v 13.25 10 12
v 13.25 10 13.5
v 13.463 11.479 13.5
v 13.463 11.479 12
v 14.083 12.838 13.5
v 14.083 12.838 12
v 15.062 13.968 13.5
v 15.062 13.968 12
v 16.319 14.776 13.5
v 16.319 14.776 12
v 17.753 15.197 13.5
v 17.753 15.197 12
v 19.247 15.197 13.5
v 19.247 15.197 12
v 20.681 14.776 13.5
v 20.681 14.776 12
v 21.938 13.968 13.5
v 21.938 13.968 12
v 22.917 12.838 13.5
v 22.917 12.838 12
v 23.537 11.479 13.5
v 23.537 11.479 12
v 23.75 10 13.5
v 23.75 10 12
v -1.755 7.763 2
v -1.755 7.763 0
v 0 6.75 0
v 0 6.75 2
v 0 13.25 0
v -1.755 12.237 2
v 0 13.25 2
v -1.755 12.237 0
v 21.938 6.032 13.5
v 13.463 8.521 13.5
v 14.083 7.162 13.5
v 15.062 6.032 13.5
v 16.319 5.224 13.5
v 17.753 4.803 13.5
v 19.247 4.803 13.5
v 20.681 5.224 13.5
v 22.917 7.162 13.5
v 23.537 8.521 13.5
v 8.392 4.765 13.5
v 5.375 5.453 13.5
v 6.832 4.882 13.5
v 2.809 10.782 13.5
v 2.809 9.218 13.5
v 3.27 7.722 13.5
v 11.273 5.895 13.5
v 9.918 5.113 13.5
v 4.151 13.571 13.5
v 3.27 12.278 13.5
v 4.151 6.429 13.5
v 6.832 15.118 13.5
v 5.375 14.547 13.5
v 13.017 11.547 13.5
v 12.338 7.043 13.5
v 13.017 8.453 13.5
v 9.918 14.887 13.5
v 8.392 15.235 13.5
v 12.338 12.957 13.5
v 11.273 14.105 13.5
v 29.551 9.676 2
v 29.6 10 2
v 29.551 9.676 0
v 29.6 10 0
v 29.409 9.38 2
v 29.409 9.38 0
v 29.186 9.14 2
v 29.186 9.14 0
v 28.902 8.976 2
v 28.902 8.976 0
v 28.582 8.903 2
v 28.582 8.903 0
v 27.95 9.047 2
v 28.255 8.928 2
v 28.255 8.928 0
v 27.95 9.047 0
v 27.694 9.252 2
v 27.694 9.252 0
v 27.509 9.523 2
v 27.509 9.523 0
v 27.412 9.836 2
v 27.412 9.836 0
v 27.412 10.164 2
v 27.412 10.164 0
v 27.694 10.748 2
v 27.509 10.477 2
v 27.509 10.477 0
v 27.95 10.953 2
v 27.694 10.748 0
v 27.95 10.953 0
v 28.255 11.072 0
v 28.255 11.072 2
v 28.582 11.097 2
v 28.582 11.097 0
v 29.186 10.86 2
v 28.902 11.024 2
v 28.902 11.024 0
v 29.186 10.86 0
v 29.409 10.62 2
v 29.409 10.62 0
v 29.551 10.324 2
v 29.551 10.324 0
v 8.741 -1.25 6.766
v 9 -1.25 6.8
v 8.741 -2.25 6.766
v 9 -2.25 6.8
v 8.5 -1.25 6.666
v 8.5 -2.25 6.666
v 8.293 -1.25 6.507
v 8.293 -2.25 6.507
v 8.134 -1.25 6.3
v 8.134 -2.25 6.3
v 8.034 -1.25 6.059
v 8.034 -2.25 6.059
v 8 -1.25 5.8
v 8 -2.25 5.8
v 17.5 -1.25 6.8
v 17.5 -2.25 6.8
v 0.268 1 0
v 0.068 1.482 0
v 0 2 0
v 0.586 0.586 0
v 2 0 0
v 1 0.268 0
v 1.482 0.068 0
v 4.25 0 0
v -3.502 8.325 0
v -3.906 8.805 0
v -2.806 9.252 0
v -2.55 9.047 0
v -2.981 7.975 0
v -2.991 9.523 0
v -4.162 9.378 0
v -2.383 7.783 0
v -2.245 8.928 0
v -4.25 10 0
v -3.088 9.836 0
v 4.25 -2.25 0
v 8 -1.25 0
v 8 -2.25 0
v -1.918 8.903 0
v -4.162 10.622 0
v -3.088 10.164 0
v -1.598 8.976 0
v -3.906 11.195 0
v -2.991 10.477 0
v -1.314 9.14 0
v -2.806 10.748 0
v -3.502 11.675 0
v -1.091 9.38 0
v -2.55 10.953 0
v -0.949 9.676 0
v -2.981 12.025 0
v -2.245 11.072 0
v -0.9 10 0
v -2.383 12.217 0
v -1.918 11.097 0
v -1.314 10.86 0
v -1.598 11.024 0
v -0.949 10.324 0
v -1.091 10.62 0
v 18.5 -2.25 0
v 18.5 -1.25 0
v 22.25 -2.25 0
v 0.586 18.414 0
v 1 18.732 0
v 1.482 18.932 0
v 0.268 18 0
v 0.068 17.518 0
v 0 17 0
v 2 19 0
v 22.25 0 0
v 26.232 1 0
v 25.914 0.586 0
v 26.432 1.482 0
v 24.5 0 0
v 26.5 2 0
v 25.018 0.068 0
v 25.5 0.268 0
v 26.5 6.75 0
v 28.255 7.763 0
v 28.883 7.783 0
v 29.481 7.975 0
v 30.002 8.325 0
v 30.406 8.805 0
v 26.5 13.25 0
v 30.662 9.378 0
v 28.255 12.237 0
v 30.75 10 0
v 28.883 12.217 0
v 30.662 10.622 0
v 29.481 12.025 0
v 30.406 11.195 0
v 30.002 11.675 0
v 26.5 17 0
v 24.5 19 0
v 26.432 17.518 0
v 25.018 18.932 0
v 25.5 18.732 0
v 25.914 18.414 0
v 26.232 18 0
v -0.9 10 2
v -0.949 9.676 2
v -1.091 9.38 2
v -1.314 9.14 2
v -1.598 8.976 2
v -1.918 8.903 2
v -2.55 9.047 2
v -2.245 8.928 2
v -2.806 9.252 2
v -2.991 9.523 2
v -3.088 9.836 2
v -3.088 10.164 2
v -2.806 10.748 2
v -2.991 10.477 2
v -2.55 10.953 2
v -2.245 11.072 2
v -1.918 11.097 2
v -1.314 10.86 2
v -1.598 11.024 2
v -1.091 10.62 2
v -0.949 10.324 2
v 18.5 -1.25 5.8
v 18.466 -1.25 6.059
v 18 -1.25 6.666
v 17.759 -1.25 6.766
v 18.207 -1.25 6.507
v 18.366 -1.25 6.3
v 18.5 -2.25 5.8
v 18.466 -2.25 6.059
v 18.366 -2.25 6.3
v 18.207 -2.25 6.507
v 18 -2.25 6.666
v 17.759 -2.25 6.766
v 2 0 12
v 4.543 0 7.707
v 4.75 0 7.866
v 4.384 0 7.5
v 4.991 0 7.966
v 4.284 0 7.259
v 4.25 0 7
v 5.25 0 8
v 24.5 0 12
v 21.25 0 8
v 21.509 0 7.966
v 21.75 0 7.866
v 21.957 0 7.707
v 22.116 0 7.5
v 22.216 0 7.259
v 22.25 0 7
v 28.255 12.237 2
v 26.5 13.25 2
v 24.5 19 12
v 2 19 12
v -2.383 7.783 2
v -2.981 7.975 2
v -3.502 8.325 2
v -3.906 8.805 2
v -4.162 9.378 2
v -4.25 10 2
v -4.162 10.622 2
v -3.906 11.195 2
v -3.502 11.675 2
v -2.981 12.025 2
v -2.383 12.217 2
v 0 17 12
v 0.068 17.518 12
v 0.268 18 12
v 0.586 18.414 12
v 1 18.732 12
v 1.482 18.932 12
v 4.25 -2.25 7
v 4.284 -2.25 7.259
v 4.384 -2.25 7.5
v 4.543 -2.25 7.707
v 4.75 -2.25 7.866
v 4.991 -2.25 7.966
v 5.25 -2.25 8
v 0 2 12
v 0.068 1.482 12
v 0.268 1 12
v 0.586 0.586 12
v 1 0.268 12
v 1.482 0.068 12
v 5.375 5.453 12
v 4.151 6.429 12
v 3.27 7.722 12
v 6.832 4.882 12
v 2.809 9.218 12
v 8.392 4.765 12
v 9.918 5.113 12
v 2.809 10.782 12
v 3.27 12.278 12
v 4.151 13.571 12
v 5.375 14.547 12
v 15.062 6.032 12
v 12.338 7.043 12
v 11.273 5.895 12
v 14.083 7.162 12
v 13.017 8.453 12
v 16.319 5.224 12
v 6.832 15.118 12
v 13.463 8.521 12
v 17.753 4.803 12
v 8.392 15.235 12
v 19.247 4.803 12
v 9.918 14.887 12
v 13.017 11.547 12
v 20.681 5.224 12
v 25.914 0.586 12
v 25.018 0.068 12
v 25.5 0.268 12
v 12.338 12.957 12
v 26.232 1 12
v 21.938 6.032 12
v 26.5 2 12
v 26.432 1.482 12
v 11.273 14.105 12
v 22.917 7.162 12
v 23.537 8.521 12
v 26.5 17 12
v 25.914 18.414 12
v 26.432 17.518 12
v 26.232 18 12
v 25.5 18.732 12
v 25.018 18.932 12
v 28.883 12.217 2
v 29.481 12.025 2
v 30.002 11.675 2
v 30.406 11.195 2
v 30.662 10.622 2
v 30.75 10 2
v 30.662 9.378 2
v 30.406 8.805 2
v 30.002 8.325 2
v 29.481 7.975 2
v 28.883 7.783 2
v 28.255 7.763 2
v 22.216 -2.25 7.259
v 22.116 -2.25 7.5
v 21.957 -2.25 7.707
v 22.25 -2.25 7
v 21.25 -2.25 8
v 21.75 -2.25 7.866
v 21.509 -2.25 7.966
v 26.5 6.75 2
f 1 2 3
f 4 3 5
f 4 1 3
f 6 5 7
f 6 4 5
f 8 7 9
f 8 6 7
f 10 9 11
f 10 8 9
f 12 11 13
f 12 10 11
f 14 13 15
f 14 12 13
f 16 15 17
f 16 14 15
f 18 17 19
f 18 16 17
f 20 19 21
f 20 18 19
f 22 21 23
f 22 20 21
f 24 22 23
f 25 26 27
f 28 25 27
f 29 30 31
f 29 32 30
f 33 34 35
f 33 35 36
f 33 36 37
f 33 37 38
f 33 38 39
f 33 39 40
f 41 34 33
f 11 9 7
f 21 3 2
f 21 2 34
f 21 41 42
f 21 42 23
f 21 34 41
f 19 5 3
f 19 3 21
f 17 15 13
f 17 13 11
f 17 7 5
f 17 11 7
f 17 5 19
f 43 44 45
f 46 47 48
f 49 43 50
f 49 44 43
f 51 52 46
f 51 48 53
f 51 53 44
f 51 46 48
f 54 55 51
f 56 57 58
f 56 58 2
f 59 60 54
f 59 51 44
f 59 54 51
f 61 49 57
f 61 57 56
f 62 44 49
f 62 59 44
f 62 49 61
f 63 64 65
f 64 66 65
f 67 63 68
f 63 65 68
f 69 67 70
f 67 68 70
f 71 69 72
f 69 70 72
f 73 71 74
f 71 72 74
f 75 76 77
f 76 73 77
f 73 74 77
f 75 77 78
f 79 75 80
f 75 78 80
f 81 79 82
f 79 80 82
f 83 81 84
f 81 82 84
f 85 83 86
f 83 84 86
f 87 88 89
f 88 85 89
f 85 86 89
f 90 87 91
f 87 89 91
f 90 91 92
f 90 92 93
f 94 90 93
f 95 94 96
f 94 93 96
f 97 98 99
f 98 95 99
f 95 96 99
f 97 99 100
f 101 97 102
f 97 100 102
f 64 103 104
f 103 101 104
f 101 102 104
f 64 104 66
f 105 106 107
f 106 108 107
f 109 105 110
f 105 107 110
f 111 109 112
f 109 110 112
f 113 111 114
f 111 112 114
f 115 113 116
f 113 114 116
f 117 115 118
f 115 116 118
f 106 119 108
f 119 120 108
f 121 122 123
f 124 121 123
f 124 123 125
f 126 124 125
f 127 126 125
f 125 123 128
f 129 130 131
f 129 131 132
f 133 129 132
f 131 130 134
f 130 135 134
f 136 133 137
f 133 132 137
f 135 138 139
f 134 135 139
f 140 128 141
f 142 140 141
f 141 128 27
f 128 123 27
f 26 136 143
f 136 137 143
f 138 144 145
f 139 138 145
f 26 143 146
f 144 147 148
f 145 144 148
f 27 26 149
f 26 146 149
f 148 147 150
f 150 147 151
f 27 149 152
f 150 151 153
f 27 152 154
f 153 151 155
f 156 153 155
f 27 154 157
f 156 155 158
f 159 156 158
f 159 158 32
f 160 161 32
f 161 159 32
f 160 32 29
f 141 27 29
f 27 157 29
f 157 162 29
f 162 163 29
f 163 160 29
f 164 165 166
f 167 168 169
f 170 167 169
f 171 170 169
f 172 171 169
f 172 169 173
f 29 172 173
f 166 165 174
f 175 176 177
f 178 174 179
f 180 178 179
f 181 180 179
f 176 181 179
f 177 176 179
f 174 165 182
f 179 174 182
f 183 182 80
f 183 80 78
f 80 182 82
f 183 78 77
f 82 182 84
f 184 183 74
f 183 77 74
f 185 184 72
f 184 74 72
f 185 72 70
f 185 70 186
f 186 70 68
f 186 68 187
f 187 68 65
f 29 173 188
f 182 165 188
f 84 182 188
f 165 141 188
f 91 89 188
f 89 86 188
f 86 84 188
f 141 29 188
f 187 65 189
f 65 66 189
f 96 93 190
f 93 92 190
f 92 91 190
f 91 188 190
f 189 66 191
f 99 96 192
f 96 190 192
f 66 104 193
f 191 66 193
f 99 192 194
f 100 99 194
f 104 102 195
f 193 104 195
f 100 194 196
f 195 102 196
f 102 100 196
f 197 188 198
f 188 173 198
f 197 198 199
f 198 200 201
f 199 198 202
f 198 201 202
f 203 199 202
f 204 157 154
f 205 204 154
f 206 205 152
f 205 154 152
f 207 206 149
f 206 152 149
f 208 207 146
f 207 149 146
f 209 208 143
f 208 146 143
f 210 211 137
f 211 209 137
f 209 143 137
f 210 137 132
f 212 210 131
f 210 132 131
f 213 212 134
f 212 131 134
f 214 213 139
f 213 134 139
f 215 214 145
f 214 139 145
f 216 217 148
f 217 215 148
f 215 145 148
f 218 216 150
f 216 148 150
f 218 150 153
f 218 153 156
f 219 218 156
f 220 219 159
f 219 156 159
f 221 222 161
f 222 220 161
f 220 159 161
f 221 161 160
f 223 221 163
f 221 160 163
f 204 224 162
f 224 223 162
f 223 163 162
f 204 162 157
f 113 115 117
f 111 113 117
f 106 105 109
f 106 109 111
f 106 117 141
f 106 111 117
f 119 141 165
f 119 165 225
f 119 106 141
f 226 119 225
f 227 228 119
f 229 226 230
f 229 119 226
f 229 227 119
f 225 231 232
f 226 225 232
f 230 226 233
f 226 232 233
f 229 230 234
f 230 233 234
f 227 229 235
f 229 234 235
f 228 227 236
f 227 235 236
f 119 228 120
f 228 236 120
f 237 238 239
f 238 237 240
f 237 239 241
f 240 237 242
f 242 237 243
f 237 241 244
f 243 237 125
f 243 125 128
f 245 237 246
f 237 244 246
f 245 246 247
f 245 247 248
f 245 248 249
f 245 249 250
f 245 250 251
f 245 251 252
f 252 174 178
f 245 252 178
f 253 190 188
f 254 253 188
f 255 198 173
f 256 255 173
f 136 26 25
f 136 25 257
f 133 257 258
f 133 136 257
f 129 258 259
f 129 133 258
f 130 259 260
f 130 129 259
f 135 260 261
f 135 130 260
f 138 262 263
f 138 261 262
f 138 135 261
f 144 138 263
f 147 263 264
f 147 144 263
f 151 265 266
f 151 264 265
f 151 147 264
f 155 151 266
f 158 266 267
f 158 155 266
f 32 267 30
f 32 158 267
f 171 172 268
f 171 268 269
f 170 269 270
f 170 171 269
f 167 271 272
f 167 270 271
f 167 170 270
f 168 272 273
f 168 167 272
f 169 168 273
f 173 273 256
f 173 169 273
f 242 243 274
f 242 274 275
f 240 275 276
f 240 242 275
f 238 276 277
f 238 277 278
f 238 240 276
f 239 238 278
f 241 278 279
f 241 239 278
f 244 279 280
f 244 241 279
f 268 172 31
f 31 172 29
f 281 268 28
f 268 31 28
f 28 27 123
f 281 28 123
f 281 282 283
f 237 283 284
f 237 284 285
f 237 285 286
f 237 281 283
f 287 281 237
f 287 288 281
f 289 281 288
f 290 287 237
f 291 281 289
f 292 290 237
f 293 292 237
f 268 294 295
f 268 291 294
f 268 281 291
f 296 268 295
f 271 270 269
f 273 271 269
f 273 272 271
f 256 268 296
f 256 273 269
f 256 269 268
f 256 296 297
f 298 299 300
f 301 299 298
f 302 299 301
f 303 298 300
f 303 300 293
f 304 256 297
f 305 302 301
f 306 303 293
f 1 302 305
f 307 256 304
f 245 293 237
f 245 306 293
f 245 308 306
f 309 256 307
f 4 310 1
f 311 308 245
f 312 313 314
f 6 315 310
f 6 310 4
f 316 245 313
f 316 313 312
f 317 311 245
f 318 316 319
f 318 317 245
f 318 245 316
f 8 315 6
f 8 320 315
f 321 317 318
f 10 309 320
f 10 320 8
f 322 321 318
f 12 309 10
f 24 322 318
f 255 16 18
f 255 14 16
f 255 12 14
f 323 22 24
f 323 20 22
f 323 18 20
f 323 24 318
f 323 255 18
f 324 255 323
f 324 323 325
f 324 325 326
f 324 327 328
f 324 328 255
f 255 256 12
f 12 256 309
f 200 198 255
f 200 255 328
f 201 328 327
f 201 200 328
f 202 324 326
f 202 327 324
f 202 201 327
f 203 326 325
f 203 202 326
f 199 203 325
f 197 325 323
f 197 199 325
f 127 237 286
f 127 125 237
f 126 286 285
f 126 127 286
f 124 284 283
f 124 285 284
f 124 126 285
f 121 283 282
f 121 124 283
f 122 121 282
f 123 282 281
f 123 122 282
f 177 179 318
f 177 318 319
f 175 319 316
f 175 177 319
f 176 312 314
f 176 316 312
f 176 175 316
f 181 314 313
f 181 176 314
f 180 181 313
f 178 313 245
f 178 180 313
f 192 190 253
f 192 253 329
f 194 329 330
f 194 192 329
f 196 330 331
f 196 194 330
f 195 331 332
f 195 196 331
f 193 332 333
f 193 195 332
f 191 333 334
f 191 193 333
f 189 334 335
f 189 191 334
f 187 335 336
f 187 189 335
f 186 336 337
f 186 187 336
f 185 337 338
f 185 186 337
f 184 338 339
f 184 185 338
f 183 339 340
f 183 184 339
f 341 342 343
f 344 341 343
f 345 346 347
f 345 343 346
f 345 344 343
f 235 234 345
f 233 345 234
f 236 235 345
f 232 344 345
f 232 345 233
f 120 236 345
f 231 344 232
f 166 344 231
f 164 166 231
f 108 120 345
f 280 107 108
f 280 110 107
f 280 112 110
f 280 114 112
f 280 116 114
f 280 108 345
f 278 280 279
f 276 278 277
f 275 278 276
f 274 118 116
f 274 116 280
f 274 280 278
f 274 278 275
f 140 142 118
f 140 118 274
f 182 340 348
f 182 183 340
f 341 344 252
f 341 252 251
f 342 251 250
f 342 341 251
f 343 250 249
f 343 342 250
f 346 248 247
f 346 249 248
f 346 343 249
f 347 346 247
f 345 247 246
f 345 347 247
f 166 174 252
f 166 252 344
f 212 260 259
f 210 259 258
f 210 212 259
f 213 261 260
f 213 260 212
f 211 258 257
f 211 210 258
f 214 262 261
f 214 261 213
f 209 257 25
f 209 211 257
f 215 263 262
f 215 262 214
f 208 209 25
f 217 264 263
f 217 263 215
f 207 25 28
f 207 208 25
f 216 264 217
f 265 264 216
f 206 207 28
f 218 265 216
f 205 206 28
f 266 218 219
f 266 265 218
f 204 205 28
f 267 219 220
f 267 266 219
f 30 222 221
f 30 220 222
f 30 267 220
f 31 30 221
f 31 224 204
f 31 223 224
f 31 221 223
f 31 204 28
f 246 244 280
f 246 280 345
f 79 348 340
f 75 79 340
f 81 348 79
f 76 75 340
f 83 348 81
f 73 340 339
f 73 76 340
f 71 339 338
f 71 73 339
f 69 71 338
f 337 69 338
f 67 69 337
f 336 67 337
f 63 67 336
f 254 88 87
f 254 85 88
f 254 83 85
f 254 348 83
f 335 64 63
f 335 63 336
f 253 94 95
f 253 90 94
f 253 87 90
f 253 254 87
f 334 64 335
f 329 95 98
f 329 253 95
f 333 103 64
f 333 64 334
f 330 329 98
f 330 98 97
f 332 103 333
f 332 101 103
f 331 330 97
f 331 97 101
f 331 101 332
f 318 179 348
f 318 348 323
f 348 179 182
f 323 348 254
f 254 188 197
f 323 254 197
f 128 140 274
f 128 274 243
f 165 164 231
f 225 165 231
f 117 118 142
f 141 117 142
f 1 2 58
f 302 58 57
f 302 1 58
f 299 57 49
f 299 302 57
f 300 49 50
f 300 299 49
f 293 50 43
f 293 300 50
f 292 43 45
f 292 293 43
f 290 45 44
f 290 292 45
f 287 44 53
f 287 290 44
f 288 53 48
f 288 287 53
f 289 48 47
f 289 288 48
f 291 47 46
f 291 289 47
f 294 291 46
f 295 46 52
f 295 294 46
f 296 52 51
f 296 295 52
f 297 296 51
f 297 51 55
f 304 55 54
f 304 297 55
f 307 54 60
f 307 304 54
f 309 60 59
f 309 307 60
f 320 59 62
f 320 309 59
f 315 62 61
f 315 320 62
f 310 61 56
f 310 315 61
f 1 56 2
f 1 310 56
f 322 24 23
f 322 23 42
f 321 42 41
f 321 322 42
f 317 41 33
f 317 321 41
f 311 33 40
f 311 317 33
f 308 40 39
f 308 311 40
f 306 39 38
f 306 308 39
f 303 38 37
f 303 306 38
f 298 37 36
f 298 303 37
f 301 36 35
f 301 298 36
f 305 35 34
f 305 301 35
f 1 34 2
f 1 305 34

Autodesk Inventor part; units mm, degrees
ref_plane "YZ Plane" through (0, 0, 0) normal (1, 0, 0) x (0, 1, 0)
ref_plane "XZ Plane" through (0, 0, 0) normal (0, 1, 0) x (-1, 0, 0)
ref_plane "XY Plane" through (0, 0, 0) normal (0, 0, 1) x (1, 0, 0)
sketch "Sketch1" plane through (0, 0, 0) normal (0, 0, 1) x (1, 0, 0)
  line L0 (2, 0) -> (24.5, 0)
  line L1 (26.5, 2) -> (26.5, 17)
  line L2 (24.5, 19) -> (2, 19)
  line L3 (0, 17) -> (0, 2)
  arc A0 (2, 19) -> (0, 17) centre (2, 17) ccw
  arc A1 (26.5, 17) -> (24.5, 19) centre (24.5, 17) ccw
  arc A2 (0, 2) -> (2, 0) centre (2, 2) ccw
  arc A3 (24.5, 0) -> (26.5, 2) centre (24.5, 2) ccw
  line L4 (4.25, 0) -> (22.25, 0)
  line L5 (22.25, 0) -> (22.25, -2.25)
  line L6 (22.25, -2.25) -> (4.25, -2.25)
  line L7 (4.25, -2.25) -> (4.25, 0)
  circle A4 centre (-2, 10) radius 1.1
  circle A5 centre (28.5, 10) radius 1.1
  arc A6 (-1.7552, 12.2366) -> (-1.7552, 7.7634) centre (-2, 10) ccw
  arc A7 (28.2552, 7.7634) -> (28.2552, 12.2366) centre (28.5, 10) ccw
  circle A8 centre (18.5, 10) radius 5.25
  circle A9 centre (8, 10) radius 5.25
  line L8 (-1.7552, 12.2366) -> (0, 13.25)
  line L9 (-1.7552, 7.7634) -> (0, 6.75)
  line L10 (13.25, 19) -> (13.25, 0) construction
  line L11 (28.2552, 12.2366) -> (26.5, 13.25)
  line L12 (28.2552, 7.7634) -> (26.5, 6.75)
  circle A10 centre (8, 10) radius 5
  circle A11 centre (18.5, 10) radius 5
  point P0 (0, 0)
  point P1 (26.5, 19)
  point P2 (26.5, 0)
  point P3 (0, 19)
  point P4 (13.25, 0)
  point P5 (13.25, -2.25)
  point P6 (13.25, 10)
  dimension "d10" = 10.5
  dimension "d11" = 10.5
  dimension "d0" = 26.5
  dimension "d1" = 19
  dimension "d2" = 2
  dimension "d3" = 21.25
  dimension "d4" = 18
  dimension "d5" = 2.2
  dimension "d6" = 4.5
  dimension "d7" = 4.5
  dimension "d8" = 9
  dimension "d9" = 30.5
  dimension "d12" = 10.5
  dimension "d13" = 15.25
  dimension "d14" = 60
  dimension "d15" = 60
  dimension "d16" = 3.25
  dimension "d17" = 3.25
  dimension "d18" = 10
  dimension "d19" = 10
  dimension "d20" = 60
  dimension "d21" = 60
  dimension "d22" = 3.25
  dimension "d23" = 3.25
  dimension "d24" = 10
  dimension "d25" = 10
extrude "Extrusion1" add sketch "Sketch1" along normal blind 12 contours A2 L3 A0 L2 A1 L1 A3 L0
extrude "Extrusion2" add sketch "Sketch1" along normal blind 2 contours L9 A6 L8 L3 | L1 L11 A7 L12
extrude "Extrusion3" add sketch "Sketch1" along normal blind 8 contours L0 L5 L6 L7
fillet "Fillet1" radius 1 2 edges at (4.25, -1.125, 8) (22.25, -1.125, 8)
sketch "Sketch2" plane through (4.25, -2.25, 0) normal (0, -1, 0) x (1, 0, 0)
  line L0 (0, 0) -> (18, 0) projected
  line L1 (3.75, 0) -> (14.25, 0)
  line L2 (14.25, 0) -> (14.25, 5.8)
  line L3 (13.25, 6.8) -> (4.75, 6.8)
  line L4 (3.75, 5.8) -> (3.75, 0)
  line L5 (1, 8) -> (17, 8) projected
  arc A0 (4.75, 6.8) -> (3.75, 5.8) centre (4.75, 5.8) ccw
  arc A1 (14.25, 5.8) -> (13.25, 6.8) centre (13.25, 5.8) ccw
  point P0 (-4.25, 0)
  point P1 (9, 6.8)
  point P2 (9, 8)
  dimension "d33" = 6.8
  dimension "d35" = 10.5
  dimension "d36" = 1
extrude "Extrusion4" cut sketch "Sketch2" against normal blind 1
extrude "Extrusion5" add sketch "Sketch1" along normal blind 13.5 contours A8 | A9 | A10 | A11
properties part number "lidarsensor"
